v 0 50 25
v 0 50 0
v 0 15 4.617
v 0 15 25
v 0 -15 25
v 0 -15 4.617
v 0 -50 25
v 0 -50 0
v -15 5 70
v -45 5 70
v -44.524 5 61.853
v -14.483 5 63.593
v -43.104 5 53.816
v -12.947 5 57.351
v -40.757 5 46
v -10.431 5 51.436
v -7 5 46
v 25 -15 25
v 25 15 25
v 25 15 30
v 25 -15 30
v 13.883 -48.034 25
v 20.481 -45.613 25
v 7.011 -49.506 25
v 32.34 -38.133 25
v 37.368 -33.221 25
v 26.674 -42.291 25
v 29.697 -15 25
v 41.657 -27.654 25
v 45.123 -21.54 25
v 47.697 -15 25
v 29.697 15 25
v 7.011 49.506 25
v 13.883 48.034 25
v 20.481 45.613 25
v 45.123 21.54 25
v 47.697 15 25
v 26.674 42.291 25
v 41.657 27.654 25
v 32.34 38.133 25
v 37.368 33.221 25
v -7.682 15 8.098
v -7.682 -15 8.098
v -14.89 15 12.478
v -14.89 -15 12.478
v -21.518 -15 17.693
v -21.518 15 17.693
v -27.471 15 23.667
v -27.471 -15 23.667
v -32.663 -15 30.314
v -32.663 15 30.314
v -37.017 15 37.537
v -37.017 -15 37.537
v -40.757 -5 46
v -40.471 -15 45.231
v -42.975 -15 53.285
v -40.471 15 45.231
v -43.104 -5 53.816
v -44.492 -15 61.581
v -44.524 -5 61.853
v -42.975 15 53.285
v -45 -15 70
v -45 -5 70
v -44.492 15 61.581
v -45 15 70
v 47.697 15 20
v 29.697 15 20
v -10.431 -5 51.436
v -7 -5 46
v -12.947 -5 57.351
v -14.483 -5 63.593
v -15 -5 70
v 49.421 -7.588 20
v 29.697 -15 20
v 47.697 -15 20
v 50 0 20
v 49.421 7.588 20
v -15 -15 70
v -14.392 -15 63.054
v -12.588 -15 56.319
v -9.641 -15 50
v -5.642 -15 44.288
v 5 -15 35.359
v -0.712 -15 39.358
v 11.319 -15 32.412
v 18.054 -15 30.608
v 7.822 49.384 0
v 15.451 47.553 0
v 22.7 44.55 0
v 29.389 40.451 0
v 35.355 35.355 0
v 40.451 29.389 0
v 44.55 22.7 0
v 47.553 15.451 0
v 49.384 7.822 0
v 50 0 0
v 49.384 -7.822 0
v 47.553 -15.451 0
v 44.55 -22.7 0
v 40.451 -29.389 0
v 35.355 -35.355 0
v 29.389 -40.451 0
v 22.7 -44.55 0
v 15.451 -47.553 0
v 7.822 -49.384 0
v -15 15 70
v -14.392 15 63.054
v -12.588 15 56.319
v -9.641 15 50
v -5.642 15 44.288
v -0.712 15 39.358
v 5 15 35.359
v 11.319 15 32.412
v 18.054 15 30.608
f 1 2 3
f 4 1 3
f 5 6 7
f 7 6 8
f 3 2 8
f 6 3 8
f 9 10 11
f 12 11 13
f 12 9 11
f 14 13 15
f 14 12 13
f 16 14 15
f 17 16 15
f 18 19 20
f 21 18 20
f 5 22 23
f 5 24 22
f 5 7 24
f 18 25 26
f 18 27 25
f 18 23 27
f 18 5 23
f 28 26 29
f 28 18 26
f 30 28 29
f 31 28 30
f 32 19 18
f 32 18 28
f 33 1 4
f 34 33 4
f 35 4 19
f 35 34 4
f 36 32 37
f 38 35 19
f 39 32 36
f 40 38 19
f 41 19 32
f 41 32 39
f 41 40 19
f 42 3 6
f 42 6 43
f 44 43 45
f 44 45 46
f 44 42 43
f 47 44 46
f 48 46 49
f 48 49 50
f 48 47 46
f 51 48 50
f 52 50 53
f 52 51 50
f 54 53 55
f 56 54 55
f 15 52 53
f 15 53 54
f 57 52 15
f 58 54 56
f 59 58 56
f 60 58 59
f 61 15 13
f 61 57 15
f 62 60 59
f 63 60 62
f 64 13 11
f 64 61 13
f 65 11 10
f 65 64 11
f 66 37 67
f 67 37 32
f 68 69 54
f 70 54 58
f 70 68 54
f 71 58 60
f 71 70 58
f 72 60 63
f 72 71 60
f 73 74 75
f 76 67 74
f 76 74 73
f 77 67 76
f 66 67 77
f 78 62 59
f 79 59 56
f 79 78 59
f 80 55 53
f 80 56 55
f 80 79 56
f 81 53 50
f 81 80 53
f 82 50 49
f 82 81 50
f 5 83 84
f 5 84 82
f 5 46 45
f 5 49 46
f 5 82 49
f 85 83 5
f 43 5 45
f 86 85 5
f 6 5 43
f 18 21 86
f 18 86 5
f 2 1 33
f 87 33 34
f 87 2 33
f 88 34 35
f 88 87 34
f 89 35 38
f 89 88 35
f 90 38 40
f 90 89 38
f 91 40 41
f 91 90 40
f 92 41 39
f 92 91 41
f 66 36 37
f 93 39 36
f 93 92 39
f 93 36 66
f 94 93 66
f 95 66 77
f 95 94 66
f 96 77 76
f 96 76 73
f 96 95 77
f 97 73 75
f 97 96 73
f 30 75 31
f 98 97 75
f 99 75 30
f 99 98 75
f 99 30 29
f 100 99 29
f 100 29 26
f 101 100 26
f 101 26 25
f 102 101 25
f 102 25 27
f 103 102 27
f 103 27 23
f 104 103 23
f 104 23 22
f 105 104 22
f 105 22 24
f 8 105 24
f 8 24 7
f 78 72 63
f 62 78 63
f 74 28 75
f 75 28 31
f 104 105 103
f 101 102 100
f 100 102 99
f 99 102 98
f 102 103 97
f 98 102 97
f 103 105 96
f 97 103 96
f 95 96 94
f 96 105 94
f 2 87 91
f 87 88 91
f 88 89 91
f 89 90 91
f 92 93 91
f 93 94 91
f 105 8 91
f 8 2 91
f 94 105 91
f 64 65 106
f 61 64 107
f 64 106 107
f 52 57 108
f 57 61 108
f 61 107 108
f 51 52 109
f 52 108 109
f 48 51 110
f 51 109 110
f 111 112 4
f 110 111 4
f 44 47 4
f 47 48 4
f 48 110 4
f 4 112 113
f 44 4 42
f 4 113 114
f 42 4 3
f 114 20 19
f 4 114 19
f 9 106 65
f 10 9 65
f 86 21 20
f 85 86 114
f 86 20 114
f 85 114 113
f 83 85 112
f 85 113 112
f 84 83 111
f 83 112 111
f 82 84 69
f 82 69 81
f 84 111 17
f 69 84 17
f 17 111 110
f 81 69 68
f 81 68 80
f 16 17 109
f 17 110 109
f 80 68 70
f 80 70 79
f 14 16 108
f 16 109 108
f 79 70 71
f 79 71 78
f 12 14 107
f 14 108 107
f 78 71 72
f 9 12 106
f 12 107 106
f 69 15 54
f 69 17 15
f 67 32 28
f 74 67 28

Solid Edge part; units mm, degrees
sketch "Sketch1" plane through (0, 0, 0) normal (0, 0, 1) x (1, 0, 0)
  line L0 (0, 0) -> (0, -50)
  line L1 (0, 0) -> (0, 50)
  arc A0 (0, 50) -> (0, -50) centre (0, 0) cw
extrude "Protrusion1" add sketch "Sketch1" along normal blind 25
extrude "Protrusion2" [suppressed]
sketch "Sketch2" plane through (0, 0, 0) normal (0, -1, 0) x (1, 0, 0)
  arc A0 (25, 30) -> (-15, 70) centre (25, 70) cw
  line L0 (-15, 70) -> (-45, 70)
  arc A1 (25, 0) -> (-45, 70) centre (25, 70) cw
  line L1 (25, 0) -> (25, 30)
extrude "ExtrudedProtrusion_4" add sketch "Sketch2" along normal mid plane 30
sketch "Sketch3" plane through (25, 0, 25) normal (0, 0, 1) x (1, 0, 0)
  line L0 (22.697, 15) -> (4.697, 15)
  line L1 (4.697, 15) -> (4.697, -15)
  line L2 (4.697, -15) -> (22.697, -15)
extrude "ExtrudedCutout_1" cut sketch "Sketch3" against normal blind 5 material side at (38.697, 14.95, 25)
sketch "Sketch4" plane through (0, 0, 12.5) normal (-1, 0, 0) x (0, -1, 0)
  line L0 (5, 33.5) -> (5, 57.5)
  line L1 (-5, 33.5) -> (5, 33.5)
  line L2 (-5, 57.5) -> (-5, 33.5)
extrude "ExtrudedCutout_2" cut sketch "Sketch4" along normal blind 66.0062 material side at (0, -4.95, 58)
